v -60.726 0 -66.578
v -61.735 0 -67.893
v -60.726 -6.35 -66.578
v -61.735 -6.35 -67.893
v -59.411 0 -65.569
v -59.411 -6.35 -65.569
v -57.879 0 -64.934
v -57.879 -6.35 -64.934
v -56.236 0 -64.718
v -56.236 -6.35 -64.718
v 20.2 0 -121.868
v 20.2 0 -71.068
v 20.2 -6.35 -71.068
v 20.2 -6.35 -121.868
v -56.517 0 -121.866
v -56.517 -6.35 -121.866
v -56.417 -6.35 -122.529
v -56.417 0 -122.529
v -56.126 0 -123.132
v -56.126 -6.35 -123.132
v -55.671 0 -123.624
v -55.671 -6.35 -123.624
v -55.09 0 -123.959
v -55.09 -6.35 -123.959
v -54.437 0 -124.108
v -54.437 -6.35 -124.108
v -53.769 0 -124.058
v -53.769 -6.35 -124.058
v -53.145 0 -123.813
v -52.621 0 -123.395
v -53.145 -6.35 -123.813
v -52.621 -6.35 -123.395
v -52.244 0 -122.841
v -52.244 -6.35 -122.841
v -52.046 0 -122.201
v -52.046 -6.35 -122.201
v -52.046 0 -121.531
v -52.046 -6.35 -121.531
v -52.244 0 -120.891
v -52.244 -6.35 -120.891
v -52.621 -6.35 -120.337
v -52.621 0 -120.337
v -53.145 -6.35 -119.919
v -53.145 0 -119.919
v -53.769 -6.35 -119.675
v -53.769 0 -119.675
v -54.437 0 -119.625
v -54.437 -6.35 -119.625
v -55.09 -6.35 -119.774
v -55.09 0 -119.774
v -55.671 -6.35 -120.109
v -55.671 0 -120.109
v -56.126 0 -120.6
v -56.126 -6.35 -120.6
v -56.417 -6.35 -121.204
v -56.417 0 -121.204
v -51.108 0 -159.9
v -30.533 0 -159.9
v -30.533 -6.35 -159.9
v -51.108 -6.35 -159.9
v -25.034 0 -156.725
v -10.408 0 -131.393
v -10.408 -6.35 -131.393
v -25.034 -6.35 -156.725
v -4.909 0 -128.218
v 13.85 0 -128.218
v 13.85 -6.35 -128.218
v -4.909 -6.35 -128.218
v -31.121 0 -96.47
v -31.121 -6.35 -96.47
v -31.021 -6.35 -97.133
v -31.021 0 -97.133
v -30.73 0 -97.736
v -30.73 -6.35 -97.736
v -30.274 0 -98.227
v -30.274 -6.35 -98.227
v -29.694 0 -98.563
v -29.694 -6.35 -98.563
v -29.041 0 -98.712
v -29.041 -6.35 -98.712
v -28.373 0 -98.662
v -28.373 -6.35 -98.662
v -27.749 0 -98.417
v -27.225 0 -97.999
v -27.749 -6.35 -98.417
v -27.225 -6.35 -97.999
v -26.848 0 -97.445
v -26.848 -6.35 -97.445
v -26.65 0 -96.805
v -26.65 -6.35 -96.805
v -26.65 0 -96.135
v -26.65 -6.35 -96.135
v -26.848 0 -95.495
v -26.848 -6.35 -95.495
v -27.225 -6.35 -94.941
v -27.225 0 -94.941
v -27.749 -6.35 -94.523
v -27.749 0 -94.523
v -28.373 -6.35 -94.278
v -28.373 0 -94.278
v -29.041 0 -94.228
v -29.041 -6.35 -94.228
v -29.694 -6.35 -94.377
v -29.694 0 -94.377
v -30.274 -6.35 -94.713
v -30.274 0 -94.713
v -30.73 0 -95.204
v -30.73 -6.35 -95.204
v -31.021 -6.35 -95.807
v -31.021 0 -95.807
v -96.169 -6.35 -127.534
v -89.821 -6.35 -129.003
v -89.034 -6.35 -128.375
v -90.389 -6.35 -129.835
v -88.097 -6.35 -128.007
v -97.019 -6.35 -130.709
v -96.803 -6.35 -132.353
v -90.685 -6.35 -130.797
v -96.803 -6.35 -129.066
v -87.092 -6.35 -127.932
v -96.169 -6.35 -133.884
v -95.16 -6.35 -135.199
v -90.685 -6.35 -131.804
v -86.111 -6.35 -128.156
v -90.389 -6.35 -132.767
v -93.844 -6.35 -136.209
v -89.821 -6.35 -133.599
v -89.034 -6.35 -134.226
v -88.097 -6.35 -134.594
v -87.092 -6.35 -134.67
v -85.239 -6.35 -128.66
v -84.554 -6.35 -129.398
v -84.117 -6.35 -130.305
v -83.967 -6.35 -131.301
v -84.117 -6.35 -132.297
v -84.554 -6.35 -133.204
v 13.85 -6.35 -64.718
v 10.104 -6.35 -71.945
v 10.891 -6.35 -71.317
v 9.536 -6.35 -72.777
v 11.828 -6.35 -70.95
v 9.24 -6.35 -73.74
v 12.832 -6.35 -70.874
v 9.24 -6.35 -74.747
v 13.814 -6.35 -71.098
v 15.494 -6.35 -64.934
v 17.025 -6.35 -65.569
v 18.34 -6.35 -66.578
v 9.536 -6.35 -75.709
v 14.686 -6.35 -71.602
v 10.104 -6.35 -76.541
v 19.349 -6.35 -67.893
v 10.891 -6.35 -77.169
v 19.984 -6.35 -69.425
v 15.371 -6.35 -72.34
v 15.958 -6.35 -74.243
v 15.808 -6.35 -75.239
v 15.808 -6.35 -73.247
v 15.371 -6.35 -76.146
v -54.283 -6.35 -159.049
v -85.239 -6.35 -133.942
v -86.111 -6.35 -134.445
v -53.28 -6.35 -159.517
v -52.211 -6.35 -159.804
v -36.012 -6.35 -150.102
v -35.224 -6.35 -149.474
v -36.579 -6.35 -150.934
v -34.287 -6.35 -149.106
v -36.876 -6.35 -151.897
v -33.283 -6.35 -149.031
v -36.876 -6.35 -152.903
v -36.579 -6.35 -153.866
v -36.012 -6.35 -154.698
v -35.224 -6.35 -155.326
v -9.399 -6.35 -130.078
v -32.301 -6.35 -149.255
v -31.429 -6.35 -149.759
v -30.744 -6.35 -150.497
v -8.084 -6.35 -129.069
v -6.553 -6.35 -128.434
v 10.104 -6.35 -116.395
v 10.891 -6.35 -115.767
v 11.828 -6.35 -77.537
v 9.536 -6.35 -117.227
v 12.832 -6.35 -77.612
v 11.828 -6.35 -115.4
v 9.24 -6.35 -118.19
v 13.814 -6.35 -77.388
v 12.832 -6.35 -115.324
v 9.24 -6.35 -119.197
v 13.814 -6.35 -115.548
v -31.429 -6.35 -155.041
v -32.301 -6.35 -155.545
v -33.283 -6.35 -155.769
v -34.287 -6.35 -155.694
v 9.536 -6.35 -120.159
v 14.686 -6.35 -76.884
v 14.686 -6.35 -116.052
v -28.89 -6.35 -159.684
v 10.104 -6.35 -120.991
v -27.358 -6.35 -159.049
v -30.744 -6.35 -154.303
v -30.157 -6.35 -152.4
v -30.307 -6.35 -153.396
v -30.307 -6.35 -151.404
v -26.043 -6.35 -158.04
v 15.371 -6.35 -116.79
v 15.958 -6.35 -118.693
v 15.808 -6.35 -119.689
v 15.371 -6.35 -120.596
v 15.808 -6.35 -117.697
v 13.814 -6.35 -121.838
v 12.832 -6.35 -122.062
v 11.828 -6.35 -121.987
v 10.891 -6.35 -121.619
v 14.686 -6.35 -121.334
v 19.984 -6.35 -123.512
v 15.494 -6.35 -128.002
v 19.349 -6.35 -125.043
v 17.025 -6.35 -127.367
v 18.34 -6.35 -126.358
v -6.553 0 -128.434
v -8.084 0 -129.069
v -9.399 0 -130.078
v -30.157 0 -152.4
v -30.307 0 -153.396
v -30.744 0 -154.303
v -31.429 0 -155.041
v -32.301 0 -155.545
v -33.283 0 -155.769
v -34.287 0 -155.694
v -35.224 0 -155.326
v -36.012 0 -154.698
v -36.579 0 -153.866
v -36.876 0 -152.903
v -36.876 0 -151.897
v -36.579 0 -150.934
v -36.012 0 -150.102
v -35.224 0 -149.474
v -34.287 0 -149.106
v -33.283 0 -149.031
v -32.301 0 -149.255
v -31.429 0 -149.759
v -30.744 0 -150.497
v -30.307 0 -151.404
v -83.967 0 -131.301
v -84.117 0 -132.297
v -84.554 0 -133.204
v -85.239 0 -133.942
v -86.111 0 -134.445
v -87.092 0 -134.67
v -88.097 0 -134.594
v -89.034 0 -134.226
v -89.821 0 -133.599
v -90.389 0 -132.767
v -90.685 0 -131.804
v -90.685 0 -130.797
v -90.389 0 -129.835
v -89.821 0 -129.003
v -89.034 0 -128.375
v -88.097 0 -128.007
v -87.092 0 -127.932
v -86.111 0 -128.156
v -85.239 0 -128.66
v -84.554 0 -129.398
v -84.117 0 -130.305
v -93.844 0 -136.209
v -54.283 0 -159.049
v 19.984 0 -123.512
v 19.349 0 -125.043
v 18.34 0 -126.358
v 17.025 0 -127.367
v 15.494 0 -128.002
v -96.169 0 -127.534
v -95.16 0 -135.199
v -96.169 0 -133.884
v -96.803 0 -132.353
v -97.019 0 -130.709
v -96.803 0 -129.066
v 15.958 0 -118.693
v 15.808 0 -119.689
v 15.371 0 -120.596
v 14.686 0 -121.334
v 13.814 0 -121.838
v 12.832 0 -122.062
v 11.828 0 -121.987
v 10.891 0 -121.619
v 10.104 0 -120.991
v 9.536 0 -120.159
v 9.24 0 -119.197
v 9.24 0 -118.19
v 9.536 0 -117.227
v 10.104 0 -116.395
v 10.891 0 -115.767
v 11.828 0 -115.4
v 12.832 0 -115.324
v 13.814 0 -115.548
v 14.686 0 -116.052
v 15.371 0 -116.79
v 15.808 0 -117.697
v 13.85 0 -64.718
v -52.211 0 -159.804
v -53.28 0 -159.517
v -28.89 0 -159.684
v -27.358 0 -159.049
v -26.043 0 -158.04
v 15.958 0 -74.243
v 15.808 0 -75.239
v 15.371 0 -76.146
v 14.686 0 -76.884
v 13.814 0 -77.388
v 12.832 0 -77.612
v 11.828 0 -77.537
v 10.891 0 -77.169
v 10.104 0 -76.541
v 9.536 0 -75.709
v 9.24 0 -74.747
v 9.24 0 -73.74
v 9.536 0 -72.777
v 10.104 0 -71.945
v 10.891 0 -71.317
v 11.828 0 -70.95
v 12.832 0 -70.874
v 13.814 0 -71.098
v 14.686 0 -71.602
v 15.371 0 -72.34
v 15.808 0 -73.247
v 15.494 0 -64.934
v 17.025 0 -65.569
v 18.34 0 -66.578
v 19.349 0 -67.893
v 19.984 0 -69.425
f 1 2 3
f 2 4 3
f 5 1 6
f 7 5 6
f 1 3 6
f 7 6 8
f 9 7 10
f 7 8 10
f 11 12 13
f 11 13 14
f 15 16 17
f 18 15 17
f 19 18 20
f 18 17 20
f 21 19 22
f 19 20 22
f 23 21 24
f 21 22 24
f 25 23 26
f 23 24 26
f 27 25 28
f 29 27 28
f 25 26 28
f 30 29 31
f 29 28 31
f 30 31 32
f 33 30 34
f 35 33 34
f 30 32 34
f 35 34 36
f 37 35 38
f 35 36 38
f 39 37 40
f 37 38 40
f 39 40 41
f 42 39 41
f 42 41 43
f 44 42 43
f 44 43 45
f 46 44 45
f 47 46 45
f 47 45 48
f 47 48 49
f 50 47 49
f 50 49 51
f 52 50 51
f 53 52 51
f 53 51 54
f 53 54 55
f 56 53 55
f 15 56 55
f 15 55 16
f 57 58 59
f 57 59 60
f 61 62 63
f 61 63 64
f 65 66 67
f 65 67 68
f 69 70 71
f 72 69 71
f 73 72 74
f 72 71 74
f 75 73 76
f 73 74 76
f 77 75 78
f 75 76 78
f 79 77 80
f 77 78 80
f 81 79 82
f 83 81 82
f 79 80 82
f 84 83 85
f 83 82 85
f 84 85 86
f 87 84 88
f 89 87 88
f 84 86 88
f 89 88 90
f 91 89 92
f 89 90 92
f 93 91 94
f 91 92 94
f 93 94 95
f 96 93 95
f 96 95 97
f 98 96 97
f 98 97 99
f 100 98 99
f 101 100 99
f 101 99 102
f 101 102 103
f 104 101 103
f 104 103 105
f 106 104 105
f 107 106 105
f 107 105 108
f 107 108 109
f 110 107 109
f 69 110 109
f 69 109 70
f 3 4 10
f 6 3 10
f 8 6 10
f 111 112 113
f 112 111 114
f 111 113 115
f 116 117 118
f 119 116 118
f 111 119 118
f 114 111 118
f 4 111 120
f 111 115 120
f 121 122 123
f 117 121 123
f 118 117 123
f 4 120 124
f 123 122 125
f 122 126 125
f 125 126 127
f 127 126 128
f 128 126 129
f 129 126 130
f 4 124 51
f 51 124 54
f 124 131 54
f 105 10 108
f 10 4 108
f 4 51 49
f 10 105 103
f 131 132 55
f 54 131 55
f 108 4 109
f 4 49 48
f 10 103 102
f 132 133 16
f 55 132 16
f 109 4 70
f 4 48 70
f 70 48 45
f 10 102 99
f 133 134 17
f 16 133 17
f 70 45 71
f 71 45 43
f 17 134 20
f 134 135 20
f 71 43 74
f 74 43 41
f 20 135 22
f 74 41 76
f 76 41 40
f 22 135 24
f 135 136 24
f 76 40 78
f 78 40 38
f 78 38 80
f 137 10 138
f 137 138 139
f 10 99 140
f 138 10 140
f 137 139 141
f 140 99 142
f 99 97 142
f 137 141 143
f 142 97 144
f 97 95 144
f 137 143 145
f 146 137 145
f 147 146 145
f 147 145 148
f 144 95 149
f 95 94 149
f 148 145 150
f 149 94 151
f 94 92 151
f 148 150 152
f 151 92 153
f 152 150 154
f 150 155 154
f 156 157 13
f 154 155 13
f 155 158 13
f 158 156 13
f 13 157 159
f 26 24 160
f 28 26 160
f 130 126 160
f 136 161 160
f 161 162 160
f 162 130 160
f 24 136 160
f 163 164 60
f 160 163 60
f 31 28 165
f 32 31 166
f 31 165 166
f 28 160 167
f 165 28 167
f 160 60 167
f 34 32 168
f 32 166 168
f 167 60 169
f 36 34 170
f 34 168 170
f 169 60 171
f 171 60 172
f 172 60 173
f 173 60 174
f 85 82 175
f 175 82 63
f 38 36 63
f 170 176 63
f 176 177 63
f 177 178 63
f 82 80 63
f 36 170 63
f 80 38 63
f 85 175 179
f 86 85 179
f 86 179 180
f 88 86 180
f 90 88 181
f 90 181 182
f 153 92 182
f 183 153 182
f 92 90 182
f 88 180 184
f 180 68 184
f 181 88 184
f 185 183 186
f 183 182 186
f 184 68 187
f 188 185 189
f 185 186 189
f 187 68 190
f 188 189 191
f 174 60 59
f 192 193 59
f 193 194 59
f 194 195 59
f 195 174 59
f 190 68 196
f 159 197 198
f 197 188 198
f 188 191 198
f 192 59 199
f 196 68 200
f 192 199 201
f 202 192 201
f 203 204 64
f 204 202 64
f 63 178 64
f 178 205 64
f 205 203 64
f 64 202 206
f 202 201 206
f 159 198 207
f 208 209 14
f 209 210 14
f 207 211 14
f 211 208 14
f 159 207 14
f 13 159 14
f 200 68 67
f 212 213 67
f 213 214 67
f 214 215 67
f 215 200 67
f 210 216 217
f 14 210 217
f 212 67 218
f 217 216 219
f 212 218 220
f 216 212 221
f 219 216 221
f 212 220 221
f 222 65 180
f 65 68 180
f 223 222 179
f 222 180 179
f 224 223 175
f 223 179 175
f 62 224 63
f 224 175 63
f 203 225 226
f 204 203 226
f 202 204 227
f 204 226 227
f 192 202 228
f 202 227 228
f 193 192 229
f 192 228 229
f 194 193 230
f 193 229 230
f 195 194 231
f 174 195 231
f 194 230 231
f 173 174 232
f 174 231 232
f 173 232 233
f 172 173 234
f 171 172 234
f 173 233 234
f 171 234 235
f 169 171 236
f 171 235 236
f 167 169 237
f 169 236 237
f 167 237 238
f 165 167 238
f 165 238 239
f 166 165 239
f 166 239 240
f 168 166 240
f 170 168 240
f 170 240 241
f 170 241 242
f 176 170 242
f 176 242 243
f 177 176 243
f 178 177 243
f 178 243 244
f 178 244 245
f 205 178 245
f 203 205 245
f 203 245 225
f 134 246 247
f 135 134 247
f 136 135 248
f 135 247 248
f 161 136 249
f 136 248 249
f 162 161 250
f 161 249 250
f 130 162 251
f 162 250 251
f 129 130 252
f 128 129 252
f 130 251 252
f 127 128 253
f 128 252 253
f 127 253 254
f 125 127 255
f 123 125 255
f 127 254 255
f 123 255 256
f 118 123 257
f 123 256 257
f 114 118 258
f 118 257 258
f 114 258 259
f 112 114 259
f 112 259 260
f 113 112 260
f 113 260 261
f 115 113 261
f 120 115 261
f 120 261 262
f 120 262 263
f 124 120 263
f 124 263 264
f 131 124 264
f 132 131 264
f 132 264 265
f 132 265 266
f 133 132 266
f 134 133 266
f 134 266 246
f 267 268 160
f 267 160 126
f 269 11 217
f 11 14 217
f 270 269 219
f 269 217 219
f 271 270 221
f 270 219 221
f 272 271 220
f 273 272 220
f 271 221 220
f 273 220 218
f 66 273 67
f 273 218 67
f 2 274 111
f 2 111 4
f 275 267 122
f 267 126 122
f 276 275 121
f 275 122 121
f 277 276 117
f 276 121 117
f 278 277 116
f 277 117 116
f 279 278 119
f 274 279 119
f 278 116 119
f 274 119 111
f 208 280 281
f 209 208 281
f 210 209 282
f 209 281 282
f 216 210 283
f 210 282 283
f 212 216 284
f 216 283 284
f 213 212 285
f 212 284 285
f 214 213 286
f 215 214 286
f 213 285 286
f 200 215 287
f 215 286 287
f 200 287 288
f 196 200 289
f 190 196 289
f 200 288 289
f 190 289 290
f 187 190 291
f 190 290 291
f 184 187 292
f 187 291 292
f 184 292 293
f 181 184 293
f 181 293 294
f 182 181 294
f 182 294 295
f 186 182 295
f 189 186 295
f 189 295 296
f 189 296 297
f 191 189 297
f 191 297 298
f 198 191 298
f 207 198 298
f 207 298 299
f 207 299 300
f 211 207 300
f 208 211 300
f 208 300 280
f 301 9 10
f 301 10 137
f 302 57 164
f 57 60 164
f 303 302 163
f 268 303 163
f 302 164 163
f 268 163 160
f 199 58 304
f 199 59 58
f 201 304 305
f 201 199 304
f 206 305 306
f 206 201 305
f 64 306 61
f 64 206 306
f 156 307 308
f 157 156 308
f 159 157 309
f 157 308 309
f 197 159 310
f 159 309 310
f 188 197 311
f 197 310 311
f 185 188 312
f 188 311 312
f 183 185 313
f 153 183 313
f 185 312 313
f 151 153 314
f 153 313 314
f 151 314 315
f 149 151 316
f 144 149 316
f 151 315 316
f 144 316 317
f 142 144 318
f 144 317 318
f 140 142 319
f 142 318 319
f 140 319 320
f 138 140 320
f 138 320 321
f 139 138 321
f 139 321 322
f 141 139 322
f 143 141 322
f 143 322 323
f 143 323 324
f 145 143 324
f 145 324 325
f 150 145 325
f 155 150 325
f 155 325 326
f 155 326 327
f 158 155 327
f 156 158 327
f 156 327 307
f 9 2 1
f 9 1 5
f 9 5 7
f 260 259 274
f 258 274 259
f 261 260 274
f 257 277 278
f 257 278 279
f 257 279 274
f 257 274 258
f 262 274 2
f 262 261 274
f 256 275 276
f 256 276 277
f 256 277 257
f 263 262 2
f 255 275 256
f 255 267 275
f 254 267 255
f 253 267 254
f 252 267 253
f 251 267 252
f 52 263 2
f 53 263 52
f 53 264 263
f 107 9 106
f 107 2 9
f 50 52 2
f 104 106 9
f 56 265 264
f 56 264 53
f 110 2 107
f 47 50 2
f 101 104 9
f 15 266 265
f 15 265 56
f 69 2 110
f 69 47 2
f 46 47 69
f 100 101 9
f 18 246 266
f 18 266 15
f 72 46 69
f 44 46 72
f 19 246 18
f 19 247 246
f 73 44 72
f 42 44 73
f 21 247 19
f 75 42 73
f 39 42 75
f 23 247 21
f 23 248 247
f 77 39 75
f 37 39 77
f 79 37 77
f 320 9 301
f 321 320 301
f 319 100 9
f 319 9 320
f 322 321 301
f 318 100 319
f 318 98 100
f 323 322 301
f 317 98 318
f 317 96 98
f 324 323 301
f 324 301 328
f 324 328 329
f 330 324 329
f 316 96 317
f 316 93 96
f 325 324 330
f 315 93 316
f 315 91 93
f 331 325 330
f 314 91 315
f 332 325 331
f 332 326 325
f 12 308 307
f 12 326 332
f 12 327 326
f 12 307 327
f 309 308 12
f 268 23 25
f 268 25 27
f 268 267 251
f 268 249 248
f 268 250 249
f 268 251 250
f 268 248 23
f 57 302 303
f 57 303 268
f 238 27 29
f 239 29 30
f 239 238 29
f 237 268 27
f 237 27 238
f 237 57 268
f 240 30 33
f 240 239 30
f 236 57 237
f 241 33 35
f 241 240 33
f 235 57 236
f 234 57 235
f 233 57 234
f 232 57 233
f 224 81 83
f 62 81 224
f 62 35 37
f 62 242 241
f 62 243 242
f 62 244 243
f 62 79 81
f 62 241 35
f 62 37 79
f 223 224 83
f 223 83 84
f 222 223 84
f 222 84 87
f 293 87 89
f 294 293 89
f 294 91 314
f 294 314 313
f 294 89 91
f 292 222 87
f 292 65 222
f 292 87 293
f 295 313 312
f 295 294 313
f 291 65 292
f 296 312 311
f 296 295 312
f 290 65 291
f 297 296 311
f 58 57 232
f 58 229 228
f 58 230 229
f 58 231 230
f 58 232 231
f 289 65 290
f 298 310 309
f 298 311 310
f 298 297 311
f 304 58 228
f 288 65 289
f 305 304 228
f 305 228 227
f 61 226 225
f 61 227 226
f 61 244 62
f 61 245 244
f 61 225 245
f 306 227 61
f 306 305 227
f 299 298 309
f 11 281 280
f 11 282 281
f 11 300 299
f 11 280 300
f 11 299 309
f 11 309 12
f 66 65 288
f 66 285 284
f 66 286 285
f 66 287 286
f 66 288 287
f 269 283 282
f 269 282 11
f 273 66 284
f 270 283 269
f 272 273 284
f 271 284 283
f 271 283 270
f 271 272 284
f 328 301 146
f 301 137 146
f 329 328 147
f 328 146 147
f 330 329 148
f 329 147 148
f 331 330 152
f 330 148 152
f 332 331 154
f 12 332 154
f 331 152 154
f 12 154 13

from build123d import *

# Parameters (mm, degrees)
BOSS_EXTRUDE1_DEPTH     = 6.35
FILLET1_R               = 6.35
F_1_4_CLEARANCE_HOLE2_D = 6.7564
F_8_CLEARANCE_HOLE1_D   = 4.4958


with BuildPart() as part:
    # Sketch1 → Boss-Extrude1 (new body)
    with BuildSketch(Plane(origin=(0, 0, 0), x_dir=(1, 0, 0), z_dir=(0, 1, 0))):
        Polygon((-26.866954165, 159.9), (-52.809618943, 159.9), (-99.343756128, 133.03350337), (-59.901828464, 64.718080709), (20.2, 64.718080709), (20.2, 128.218080709), (-8.575389533, 128.218080709), align=None)
    extrude(amount=-BOSS_EXTRUDE1_DEPTH)

    # Fillet1
    fillet1_edges = [part.edges().sort_by_distance(p)[0] for p in [
        (-52.809618943, -3.175, -159.9),
        (-26.866954165, -3.175, -159.9),
        (-8.575389533, -3.175, -128.218080709),
        (20.2, -3.175, -128.218080709),
        (20.2, -3.175, -64.718080709),
        (-59.901828464, -3.175, -64.718080709),
        (-99.343756128, -3.175, -133.03350337),
    ]]
    fillet(fillet1_edges, radius=FILLET1_R)

    # 1/4 Clearance Hole2 (through all)
    with Locations(Plane(origin=(0, -6.35, 0), x_dir=(-1, 0, 0), z_dir=(0, -1, 0))):
        with Locations((87.344864157, 131.300812842), (33.535349774, 152.4), (-12.58, 74.243080709), (-12.58, 118.693080709)):
            Hole(F_1_4_CLEARANCE_HOLE2_D / 2)

    # #8 Clearance Hole1 (through all)
    with Locations(Plane(origin=(0, 0, 0), x_dir=(1, 0, 0), z_dir=(0, 1, 0))):
        with Locations((-54.269039573, 121.866162864), (-28.872875262, 96.469998554)):
            Hole(F_8_CLEARANCE_HOLE1_D / 2)


solid = part.part
